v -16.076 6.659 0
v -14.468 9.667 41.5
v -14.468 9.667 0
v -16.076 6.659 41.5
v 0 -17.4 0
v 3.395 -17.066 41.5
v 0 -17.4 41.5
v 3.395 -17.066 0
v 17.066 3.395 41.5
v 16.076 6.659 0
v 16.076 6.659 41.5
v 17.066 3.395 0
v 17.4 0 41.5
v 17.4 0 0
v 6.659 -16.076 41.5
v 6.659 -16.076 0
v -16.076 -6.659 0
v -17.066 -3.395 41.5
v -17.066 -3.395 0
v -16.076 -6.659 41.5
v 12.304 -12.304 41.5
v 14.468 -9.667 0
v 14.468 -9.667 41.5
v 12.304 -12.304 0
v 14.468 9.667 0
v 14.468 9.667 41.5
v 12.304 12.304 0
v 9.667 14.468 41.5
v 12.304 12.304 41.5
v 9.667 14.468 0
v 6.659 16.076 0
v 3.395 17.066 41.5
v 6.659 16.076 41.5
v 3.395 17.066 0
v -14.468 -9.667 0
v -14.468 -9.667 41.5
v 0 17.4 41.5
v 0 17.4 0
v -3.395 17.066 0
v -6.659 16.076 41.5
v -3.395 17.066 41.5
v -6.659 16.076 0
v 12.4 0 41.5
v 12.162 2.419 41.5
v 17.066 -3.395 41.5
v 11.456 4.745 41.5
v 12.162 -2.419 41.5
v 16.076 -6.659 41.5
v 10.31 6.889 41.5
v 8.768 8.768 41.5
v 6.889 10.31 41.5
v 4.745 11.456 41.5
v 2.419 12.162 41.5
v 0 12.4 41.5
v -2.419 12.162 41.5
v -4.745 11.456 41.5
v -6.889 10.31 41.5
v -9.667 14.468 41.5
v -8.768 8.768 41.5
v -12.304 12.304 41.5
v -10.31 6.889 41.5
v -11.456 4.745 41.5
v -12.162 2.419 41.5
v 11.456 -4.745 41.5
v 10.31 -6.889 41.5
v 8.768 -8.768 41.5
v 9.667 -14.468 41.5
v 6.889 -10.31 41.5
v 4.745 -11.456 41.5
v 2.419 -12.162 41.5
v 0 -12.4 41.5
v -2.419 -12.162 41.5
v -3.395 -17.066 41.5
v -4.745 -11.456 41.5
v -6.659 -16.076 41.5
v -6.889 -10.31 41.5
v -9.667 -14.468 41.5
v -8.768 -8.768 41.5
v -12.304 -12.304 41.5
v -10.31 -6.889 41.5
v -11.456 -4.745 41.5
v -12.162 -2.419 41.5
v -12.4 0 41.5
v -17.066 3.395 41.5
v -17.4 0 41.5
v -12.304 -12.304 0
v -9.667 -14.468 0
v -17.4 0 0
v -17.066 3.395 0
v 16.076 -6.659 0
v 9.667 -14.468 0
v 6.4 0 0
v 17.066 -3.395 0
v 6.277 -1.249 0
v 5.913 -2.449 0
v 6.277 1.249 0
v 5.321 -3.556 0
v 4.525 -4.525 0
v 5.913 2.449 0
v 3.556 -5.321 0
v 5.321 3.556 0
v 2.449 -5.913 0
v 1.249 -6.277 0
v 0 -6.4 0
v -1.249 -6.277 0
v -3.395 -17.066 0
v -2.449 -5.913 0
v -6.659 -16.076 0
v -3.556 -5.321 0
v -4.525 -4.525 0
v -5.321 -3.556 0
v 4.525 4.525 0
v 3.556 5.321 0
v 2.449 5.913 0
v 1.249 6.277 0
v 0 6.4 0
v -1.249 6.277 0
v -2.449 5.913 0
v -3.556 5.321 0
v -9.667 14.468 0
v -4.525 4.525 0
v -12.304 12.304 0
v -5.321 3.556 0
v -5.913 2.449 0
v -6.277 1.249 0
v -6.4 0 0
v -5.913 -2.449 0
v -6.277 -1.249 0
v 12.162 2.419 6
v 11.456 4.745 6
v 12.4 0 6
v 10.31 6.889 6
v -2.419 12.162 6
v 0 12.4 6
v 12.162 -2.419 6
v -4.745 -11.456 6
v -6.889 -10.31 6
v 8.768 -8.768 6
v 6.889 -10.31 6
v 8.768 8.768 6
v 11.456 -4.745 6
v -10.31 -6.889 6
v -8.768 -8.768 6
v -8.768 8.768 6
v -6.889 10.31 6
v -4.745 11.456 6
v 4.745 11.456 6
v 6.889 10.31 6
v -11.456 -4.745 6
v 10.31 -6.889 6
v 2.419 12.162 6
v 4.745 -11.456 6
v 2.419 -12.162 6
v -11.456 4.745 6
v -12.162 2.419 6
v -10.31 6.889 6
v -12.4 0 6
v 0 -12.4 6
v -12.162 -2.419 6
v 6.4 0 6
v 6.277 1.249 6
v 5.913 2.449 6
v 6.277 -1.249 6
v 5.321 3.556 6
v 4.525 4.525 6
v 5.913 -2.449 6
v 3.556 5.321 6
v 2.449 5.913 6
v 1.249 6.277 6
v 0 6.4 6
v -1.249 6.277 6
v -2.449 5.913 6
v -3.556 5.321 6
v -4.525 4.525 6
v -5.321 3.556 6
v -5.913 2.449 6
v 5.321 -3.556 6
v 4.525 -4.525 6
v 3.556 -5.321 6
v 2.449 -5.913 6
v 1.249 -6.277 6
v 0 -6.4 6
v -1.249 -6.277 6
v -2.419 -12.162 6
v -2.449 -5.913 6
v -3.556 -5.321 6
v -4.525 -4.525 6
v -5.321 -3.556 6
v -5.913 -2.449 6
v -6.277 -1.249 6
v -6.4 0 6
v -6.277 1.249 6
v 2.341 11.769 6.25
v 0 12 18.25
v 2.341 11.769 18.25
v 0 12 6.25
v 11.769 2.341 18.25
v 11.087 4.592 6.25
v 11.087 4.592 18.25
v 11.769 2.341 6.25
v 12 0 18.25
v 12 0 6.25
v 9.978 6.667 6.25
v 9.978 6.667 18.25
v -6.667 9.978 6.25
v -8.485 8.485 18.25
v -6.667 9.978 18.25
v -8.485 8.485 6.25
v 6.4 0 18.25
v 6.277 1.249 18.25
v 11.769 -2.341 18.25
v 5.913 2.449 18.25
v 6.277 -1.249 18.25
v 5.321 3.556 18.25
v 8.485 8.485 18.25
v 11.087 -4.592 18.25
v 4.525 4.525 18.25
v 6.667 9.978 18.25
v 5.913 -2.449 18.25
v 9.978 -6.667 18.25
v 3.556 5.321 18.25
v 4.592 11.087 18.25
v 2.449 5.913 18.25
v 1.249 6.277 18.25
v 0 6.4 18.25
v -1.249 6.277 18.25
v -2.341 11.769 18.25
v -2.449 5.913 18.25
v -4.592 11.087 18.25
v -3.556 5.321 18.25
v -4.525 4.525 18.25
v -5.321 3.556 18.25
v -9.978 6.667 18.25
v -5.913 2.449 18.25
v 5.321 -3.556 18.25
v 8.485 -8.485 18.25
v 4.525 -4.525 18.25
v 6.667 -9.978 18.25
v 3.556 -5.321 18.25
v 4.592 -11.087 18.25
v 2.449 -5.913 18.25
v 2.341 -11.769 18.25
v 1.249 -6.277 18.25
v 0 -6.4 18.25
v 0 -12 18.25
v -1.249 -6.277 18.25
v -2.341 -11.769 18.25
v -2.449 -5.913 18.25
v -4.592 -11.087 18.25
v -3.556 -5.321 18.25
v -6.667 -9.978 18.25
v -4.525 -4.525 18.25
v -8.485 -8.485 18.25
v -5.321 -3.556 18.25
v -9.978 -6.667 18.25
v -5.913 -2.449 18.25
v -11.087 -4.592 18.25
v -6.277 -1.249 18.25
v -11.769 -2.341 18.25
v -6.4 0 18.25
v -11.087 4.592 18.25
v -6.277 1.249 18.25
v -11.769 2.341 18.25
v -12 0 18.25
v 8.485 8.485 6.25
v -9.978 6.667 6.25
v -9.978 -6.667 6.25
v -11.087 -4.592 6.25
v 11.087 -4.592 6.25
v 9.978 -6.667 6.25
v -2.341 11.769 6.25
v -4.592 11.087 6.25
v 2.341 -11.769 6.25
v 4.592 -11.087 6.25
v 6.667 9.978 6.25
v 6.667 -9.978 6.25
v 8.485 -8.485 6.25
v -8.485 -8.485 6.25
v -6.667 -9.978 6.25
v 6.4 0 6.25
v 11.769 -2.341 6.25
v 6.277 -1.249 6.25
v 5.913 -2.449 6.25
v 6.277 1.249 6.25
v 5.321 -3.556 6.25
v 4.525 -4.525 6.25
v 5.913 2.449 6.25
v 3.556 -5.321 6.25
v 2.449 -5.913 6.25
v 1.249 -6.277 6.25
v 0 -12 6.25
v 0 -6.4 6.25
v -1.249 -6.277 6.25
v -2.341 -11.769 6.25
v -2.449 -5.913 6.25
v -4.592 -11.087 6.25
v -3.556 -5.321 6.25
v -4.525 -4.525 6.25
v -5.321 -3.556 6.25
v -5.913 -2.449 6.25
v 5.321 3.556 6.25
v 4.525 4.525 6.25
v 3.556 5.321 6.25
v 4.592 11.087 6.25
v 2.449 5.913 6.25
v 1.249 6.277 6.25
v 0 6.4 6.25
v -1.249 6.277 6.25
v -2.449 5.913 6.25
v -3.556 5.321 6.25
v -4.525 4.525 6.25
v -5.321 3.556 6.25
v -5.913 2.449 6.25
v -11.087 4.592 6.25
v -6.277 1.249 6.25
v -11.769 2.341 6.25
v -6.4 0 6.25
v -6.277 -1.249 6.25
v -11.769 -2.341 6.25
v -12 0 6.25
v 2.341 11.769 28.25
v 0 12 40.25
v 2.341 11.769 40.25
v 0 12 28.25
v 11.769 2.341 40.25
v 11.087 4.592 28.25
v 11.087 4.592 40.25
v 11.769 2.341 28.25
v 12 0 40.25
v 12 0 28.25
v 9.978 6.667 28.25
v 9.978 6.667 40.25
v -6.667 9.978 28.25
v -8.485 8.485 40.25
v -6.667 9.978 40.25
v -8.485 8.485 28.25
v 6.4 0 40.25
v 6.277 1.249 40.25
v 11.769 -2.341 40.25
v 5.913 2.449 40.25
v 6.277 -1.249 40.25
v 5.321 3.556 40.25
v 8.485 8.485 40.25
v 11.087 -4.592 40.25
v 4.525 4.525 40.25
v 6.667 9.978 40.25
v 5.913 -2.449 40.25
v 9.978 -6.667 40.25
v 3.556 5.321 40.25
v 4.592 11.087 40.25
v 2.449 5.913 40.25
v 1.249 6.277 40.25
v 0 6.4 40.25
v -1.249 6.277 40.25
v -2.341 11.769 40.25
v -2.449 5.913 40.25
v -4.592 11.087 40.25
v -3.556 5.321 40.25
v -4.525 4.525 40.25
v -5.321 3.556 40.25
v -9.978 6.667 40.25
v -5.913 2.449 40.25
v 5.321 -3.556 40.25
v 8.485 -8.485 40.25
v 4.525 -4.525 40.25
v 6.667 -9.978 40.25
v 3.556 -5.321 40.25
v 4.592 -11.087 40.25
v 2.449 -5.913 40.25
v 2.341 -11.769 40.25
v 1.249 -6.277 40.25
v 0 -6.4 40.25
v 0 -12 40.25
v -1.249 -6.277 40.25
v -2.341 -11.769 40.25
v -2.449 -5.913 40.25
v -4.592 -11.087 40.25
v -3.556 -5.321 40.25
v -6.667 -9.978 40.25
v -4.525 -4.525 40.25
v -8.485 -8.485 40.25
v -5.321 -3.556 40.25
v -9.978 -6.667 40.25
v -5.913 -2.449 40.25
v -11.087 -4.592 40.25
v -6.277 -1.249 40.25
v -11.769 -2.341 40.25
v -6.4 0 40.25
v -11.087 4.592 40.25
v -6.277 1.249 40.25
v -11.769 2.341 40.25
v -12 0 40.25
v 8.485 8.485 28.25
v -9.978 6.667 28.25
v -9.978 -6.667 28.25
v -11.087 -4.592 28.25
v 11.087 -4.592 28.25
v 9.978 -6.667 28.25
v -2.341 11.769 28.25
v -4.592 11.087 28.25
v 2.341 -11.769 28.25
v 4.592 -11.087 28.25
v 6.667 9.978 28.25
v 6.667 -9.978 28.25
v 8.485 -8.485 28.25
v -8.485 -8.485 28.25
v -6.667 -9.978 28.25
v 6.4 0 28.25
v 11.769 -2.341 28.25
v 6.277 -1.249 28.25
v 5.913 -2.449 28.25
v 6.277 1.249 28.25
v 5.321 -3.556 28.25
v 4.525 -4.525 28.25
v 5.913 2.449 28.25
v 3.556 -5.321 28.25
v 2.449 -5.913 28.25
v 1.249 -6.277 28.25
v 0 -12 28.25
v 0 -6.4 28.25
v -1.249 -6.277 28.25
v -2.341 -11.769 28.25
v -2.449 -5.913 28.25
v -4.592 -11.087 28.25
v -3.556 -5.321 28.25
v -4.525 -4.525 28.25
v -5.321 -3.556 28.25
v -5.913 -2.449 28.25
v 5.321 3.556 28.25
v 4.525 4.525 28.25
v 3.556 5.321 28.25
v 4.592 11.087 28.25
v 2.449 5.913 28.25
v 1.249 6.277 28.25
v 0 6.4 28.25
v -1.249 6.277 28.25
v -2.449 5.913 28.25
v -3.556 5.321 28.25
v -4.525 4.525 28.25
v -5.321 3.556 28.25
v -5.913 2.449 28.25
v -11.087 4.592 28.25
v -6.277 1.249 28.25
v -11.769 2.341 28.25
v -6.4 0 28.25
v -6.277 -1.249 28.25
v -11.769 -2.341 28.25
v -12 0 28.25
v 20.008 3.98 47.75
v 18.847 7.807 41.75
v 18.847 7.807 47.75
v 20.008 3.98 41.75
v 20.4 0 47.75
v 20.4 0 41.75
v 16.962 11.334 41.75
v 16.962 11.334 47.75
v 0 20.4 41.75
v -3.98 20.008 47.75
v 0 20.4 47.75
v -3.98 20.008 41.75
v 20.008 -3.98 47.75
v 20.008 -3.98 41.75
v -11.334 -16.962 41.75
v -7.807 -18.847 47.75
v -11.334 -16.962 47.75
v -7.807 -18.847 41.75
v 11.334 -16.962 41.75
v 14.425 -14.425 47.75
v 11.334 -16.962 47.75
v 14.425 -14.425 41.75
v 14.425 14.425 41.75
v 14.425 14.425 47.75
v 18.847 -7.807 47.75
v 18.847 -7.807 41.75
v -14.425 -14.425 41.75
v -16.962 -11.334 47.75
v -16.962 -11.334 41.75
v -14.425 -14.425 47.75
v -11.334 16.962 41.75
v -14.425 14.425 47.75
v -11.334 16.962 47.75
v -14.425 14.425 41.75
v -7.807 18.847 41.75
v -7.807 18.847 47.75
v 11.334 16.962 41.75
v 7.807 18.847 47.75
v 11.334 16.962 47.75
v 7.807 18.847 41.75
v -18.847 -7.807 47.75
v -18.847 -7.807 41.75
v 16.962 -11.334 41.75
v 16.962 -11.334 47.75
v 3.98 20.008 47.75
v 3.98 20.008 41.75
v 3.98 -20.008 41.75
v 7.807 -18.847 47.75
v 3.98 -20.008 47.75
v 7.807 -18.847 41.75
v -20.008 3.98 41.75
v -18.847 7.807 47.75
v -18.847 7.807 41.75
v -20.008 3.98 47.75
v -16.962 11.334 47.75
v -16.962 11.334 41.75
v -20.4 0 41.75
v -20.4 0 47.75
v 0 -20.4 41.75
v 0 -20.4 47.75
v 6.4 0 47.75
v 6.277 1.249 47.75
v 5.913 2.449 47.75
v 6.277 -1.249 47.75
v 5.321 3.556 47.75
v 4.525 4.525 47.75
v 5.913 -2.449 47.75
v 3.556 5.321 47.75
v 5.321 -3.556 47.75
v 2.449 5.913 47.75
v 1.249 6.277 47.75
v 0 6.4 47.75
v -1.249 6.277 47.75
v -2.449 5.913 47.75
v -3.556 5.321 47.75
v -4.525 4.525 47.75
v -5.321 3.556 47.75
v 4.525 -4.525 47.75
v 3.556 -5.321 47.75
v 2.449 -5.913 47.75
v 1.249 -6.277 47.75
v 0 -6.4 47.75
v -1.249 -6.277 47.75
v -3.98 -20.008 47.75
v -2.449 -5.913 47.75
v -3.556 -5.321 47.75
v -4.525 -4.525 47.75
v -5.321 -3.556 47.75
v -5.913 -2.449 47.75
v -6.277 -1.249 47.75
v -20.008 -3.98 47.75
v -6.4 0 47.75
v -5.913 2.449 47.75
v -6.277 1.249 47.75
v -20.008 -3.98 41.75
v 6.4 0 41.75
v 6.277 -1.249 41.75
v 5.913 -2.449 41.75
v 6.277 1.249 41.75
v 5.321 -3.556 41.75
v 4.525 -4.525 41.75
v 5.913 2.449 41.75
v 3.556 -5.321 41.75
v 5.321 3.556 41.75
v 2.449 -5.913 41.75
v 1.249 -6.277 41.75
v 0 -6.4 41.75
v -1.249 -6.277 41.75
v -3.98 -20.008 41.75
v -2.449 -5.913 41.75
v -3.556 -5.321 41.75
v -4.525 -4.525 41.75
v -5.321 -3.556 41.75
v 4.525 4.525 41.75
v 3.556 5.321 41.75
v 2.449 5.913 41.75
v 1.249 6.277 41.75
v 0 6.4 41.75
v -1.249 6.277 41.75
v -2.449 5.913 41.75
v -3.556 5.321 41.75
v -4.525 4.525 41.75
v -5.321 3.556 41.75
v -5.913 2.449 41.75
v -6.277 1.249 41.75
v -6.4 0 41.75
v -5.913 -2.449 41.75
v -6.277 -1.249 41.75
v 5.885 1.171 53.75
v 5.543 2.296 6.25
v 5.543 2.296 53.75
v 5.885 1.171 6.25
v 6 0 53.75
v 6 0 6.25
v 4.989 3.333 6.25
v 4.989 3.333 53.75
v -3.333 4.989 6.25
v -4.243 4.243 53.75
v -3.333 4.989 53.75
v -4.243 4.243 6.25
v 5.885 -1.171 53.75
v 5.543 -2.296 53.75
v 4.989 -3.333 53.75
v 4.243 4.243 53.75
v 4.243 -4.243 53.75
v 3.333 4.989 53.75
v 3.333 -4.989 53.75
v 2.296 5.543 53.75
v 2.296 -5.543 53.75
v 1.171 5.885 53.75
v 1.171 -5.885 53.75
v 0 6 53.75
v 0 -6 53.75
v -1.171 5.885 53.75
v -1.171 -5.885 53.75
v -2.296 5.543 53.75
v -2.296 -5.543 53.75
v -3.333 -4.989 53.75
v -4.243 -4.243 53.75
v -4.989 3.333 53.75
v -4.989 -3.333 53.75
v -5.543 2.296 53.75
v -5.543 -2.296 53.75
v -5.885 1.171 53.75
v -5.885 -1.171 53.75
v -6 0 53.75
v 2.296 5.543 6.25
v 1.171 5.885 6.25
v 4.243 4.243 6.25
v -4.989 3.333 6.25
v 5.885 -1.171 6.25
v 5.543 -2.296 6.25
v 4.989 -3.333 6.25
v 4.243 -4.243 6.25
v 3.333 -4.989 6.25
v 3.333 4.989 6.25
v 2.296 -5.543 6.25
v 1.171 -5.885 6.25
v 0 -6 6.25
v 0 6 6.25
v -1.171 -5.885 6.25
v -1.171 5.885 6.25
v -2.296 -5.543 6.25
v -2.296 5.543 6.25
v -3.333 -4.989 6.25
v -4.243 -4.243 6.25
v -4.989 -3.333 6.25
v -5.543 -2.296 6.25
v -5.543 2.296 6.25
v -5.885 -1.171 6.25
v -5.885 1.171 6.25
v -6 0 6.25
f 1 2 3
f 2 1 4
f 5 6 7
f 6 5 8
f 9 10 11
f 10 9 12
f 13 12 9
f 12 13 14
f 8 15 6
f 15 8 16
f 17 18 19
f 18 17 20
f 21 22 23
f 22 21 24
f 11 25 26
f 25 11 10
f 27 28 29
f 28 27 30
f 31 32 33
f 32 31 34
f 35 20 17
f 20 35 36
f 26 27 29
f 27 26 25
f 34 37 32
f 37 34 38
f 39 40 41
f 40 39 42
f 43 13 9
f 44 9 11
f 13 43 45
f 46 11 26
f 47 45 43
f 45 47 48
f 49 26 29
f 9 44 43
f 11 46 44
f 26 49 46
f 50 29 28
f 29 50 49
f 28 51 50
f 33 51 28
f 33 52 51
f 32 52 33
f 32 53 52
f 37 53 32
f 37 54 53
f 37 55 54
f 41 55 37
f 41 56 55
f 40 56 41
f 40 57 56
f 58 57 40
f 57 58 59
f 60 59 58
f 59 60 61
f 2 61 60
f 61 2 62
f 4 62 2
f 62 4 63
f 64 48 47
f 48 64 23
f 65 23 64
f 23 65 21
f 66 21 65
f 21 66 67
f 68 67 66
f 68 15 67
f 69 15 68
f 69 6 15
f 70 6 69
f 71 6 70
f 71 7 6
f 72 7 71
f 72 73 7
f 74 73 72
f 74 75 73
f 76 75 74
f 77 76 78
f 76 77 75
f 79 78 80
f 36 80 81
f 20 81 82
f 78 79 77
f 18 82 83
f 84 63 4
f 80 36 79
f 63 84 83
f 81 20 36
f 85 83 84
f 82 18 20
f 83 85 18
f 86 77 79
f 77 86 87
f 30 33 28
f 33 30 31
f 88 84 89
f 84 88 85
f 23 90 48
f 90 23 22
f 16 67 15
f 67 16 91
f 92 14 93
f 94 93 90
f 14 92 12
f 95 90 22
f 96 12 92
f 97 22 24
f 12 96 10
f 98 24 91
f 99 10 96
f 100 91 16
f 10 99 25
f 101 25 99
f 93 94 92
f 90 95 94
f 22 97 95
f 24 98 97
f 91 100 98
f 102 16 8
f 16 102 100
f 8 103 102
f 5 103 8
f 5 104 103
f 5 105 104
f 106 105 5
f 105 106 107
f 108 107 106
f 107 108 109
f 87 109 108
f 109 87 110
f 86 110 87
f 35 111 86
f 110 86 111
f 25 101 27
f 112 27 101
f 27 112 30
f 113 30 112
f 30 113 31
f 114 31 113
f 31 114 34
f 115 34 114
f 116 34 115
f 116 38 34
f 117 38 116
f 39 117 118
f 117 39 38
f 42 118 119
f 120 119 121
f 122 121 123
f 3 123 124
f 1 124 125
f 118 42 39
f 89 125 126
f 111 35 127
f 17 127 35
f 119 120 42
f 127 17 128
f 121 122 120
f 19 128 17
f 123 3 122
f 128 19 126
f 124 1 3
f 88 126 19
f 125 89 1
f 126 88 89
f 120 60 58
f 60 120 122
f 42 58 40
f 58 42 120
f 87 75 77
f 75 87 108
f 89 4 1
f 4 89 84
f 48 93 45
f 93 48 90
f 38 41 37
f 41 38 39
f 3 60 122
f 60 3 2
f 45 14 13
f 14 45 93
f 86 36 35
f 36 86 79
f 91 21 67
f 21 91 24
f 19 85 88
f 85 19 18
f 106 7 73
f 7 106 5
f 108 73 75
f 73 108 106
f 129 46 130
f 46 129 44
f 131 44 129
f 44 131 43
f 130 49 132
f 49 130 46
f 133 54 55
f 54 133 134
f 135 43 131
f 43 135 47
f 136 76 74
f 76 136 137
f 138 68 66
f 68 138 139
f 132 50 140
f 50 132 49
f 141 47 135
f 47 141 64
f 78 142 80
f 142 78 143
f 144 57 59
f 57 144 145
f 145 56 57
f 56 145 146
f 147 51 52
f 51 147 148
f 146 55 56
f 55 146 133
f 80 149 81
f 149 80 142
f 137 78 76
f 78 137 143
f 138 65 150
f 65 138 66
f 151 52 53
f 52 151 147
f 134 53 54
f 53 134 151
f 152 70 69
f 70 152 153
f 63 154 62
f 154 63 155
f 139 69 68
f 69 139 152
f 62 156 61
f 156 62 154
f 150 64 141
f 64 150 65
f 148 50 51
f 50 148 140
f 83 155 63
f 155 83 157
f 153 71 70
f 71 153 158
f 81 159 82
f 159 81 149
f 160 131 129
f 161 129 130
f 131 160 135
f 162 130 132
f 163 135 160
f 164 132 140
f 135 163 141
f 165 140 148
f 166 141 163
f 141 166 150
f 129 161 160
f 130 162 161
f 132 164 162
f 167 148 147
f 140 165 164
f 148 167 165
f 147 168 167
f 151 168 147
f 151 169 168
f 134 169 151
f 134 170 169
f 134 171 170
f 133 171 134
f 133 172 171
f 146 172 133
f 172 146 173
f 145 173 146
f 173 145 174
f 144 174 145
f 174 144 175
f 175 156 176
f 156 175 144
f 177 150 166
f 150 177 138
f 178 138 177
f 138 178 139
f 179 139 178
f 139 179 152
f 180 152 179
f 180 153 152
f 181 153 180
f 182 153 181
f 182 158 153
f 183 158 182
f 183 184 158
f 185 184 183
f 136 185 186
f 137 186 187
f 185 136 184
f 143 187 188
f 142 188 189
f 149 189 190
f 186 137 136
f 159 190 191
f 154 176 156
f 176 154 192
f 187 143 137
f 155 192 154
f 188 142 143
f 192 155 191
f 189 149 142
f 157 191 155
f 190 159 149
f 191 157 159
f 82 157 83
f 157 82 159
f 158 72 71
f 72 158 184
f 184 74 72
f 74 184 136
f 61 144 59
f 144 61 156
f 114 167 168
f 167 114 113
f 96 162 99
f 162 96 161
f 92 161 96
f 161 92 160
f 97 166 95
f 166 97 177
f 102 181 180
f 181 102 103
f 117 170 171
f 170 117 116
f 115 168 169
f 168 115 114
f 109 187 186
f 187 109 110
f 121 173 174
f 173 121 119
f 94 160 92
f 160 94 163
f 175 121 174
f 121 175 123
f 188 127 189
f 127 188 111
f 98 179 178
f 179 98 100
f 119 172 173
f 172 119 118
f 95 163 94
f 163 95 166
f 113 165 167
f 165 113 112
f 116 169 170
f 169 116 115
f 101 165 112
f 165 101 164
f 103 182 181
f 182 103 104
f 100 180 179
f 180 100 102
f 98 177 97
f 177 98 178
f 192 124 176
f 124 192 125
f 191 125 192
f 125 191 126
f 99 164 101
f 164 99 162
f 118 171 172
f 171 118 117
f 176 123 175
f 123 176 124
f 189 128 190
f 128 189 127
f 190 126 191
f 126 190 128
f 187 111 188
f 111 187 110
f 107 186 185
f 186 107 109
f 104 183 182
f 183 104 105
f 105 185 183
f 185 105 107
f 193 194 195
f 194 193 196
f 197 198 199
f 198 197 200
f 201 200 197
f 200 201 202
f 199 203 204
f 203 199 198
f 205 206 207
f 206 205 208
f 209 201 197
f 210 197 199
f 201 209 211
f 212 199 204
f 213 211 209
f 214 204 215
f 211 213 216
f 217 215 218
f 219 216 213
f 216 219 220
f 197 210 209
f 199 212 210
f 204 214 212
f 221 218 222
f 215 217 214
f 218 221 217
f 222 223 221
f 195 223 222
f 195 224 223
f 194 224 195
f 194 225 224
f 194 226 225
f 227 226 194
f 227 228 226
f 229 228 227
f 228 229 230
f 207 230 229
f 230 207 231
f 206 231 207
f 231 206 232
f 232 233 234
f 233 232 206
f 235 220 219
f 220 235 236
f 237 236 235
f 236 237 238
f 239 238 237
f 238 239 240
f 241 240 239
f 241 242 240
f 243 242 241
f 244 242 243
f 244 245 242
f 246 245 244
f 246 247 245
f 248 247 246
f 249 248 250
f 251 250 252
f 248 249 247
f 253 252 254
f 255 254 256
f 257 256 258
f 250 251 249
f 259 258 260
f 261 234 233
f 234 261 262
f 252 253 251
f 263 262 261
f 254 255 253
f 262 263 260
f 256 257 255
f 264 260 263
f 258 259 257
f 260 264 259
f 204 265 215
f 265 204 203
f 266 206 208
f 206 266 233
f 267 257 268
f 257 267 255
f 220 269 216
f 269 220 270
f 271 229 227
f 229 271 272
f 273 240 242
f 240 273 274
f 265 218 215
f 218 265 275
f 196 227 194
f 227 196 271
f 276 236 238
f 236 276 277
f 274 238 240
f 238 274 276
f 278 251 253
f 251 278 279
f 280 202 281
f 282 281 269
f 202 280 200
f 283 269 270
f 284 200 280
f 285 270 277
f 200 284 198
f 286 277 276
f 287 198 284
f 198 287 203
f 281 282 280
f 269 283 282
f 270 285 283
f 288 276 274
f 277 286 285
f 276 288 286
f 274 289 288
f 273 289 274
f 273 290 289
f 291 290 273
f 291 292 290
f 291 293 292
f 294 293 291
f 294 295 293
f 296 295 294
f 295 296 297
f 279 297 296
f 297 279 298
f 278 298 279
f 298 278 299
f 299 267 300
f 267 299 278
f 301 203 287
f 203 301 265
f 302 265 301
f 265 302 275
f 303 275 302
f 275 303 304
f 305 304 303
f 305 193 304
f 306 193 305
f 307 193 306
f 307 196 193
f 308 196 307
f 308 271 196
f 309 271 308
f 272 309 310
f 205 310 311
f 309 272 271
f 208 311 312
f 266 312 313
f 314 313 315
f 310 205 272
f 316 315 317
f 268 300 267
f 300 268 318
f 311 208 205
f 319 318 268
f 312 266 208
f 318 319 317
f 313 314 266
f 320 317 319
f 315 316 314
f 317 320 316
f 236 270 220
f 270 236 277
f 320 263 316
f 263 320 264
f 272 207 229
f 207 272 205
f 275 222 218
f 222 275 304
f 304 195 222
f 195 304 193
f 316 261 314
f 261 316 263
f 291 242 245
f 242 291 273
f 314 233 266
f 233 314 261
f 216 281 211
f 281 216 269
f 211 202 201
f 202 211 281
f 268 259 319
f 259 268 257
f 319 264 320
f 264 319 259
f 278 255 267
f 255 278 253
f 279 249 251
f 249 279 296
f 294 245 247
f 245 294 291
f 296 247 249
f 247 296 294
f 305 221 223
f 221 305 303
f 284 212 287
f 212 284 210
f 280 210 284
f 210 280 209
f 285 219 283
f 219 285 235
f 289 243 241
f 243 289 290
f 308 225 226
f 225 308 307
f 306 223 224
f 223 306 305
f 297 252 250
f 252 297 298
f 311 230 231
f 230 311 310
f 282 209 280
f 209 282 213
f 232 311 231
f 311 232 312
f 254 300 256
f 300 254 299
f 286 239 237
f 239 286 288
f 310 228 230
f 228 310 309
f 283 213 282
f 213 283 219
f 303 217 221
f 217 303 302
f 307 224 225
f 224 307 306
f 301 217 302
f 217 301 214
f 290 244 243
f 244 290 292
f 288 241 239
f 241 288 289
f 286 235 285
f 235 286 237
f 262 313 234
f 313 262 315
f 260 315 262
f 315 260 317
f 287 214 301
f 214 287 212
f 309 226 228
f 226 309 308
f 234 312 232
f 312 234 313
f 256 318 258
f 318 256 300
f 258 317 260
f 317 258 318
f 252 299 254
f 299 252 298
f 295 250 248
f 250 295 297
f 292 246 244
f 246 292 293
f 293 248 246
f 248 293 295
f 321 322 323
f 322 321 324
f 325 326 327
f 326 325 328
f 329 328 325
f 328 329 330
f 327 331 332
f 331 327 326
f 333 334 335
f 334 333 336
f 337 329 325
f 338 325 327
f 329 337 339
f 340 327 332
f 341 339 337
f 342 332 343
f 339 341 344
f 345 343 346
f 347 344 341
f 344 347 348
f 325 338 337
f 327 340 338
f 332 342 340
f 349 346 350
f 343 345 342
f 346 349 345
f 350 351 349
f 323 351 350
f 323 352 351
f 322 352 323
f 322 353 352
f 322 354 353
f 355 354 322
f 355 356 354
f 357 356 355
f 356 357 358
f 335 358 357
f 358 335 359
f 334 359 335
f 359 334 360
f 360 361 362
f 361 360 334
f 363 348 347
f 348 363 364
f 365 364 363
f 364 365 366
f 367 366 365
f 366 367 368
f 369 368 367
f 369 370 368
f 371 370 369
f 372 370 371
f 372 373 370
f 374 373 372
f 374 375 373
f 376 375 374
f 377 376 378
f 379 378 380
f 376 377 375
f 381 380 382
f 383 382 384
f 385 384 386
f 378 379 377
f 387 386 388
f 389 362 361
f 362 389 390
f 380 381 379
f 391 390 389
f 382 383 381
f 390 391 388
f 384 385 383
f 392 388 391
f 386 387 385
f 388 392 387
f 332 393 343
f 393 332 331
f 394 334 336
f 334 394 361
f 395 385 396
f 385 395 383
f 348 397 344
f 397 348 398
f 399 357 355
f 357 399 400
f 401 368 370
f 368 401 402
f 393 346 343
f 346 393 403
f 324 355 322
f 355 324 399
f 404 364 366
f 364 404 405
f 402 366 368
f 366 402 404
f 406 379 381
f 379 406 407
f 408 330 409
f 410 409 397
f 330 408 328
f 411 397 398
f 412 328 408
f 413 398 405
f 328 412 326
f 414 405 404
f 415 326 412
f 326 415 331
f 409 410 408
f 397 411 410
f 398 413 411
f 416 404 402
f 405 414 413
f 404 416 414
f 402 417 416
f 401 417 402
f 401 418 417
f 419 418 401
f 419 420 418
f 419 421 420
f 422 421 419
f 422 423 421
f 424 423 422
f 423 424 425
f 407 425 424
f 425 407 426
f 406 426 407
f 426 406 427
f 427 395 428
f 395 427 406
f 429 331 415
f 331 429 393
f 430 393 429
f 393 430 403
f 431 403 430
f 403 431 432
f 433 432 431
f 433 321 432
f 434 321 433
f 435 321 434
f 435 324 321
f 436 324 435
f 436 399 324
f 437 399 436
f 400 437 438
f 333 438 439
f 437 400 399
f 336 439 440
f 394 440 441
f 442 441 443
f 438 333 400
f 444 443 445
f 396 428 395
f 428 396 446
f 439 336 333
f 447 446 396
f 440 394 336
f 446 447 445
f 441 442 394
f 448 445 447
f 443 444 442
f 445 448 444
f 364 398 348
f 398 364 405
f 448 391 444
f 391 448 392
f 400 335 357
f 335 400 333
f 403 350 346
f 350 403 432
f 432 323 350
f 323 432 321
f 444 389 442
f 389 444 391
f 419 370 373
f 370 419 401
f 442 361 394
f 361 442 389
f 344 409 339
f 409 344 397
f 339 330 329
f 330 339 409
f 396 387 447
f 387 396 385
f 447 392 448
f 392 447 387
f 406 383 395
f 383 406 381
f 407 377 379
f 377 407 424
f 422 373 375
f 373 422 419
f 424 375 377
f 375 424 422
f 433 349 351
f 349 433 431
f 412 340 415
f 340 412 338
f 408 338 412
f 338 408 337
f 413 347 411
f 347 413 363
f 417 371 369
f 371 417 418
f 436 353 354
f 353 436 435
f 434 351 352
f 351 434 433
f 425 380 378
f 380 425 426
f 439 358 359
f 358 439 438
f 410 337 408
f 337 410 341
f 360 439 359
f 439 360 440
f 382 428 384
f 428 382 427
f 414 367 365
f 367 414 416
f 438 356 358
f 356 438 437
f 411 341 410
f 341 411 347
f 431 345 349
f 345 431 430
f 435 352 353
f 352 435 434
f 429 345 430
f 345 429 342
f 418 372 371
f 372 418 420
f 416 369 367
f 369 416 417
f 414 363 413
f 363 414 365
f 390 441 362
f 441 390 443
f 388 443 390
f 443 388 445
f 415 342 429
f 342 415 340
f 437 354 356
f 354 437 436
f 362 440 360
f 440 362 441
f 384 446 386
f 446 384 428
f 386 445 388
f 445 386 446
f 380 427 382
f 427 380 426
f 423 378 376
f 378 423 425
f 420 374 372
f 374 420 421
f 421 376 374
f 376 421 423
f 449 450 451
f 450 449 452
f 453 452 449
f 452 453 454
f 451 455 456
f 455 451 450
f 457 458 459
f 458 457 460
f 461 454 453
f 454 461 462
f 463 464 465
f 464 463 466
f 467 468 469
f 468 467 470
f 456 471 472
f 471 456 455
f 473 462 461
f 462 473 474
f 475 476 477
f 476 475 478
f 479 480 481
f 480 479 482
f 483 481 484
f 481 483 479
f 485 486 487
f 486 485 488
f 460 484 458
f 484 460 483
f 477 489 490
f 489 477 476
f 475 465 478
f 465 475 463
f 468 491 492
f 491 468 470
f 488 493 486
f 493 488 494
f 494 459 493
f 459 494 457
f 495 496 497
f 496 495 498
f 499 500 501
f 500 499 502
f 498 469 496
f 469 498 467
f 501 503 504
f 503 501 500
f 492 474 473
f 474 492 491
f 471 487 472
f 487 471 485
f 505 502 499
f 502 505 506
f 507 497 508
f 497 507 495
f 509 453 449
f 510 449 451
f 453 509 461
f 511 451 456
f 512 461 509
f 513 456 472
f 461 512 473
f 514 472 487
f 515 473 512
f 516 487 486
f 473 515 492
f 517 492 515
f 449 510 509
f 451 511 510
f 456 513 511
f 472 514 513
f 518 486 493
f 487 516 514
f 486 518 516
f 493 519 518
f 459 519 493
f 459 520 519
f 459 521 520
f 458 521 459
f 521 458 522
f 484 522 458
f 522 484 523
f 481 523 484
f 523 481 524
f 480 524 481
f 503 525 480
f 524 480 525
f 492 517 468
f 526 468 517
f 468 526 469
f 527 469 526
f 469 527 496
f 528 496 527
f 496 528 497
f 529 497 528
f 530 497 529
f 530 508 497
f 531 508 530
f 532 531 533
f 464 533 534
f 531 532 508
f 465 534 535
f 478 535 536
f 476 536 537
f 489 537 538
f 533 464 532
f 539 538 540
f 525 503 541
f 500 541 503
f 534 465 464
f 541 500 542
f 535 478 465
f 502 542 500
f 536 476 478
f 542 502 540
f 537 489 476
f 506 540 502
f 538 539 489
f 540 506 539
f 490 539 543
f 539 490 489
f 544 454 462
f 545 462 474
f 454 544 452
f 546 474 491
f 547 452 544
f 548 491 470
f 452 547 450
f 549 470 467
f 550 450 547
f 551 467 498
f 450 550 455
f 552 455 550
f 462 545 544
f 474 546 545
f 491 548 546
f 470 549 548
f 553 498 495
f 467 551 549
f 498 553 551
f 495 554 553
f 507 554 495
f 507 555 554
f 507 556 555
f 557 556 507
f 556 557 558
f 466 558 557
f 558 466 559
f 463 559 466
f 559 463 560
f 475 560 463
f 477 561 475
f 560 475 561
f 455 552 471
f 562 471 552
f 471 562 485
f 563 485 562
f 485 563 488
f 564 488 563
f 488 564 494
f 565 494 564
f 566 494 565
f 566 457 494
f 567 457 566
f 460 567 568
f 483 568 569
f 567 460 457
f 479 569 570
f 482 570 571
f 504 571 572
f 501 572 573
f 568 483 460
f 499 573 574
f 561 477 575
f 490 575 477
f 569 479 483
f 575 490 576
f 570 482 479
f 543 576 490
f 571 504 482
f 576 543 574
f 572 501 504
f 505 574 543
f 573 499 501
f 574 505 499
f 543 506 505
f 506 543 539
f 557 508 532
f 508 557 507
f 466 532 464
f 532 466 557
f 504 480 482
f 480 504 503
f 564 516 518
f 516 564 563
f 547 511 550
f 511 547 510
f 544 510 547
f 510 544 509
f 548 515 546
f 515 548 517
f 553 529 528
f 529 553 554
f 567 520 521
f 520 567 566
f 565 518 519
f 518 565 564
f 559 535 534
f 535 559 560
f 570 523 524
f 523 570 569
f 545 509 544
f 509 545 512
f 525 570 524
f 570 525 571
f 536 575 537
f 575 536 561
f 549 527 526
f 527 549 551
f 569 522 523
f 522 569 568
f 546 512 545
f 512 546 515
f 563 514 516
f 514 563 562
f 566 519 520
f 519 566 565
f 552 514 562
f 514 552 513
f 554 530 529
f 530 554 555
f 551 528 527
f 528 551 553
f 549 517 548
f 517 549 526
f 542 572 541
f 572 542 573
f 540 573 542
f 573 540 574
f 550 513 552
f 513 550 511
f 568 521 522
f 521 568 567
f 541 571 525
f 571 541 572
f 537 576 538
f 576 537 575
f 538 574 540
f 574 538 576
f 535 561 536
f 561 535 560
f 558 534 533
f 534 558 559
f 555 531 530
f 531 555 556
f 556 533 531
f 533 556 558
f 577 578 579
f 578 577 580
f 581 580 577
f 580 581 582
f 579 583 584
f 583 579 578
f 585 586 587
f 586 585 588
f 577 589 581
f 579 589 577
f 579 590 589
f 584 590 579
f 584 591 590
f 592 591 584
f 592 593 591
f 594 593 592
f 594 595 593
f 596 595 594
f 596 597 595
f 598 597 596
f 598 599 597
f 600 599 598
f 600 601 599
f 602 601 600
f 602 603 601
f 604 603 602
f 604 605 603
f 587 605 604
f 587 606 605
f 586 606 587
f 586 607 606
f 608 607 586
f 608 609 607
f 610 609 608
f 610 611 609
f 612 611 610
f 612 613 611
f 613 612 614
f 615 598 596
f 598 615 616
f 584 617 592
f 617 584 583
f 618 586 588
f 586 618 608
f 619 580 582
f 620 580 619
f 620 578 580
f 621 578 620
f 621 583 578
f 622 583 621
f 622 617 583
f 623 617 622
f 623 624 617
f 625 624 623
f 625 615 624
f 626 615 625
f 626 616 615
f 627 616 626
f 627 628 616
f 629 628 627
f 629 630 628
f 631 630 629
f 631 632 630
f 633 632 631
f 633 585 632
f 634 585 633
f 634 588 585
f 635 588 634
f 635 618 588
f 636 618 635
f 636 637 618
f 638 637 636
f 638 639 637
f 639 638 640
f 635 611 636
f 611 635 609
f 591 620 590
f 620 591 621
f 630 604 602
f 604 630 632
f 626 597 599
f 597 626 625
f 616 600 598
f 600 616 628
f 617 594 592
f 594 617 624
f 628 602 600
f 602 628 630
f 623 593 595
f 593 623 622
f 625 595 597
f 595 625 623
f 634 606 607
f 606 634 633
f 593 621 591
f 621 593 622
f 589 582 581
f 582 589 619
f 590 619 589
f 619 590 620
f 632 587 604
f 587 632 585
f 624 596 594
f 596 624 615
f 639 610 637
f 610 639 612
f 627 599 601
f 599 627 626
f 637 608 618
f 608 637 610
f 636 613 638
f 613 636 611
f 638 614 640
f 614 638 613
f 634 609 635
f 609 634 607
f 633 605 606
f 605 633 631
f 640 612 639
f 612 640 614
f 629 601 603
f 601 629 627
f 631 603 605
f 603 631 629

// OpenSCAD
$fn = 32;

// ------------------------------------------------------------------------
// Shaft station: cup d34.8 x 41.5 mm, shaft d12
// Every part is its own module, assembly() places every instance.
// ------------------------------------------------------------------------

// --- part 1 ---
module housing_cup() {
  difference() {
    cylinder(h = 41.5, d = 34.8);
    translate([0, 0, 6]) cylinder(h = 36.5, d = 24.8);
    translate([0, 0, -1]) cylinder(h = 8, d = 12.8);
  }
}

// --- part 2 ---
module bearing_lower() {
  difference() {
      translate([0, 0, 0]) cylinder(h = 12, d = 24);
      translate([0, 0, -1]) cylinder(h = 14, d = 12.8);
    }
}

// --- part 3 ---
module bearing_upper() {
  difference() {
      translate([0, 0, 0]) cylinder(h = 12, d = 24);
      translate([0, 0, -1]) cylinder(h = 14, d = 12.8);
    }
}

// --- part 4 ---
module station_shaft() {
  translate([0, 0, -23.75]) cylinder(h = 47.5, d = 12);
}

// --- part 5 ---
module station_cover() {
  difference() {
    cylinder(h = 6, d = 40.8);
    translate([0, 0, -1]) cylinder(h = 8, d = 12.8);
  }
}

// --- assembly ---
module assembly() {
  color([0.80, 0.24, 0.20]) translate([0, 0, 0]) rotate([0, 0, 0]) housing_cup();
  color([0.20, 0.45, 0.75]) translate([0, 0, 6.25]) rotate([0, 0, 0]) bearing_lower();
  color([0.25, 0.62, 0.32]) translate([0, 0, 28.25]) rotate([0, 0, 0]) bearing_upper();
  color([0.92, 0.70, 0.18]) translate([0, 0, 30]) rotate([0, 0, 0]) station_shaft();
  color([0.58, 0.35, 0.70]) translate([0, 0, 41.75]) rotate([0, 0, 0]) station_cover();
}

assembly();
